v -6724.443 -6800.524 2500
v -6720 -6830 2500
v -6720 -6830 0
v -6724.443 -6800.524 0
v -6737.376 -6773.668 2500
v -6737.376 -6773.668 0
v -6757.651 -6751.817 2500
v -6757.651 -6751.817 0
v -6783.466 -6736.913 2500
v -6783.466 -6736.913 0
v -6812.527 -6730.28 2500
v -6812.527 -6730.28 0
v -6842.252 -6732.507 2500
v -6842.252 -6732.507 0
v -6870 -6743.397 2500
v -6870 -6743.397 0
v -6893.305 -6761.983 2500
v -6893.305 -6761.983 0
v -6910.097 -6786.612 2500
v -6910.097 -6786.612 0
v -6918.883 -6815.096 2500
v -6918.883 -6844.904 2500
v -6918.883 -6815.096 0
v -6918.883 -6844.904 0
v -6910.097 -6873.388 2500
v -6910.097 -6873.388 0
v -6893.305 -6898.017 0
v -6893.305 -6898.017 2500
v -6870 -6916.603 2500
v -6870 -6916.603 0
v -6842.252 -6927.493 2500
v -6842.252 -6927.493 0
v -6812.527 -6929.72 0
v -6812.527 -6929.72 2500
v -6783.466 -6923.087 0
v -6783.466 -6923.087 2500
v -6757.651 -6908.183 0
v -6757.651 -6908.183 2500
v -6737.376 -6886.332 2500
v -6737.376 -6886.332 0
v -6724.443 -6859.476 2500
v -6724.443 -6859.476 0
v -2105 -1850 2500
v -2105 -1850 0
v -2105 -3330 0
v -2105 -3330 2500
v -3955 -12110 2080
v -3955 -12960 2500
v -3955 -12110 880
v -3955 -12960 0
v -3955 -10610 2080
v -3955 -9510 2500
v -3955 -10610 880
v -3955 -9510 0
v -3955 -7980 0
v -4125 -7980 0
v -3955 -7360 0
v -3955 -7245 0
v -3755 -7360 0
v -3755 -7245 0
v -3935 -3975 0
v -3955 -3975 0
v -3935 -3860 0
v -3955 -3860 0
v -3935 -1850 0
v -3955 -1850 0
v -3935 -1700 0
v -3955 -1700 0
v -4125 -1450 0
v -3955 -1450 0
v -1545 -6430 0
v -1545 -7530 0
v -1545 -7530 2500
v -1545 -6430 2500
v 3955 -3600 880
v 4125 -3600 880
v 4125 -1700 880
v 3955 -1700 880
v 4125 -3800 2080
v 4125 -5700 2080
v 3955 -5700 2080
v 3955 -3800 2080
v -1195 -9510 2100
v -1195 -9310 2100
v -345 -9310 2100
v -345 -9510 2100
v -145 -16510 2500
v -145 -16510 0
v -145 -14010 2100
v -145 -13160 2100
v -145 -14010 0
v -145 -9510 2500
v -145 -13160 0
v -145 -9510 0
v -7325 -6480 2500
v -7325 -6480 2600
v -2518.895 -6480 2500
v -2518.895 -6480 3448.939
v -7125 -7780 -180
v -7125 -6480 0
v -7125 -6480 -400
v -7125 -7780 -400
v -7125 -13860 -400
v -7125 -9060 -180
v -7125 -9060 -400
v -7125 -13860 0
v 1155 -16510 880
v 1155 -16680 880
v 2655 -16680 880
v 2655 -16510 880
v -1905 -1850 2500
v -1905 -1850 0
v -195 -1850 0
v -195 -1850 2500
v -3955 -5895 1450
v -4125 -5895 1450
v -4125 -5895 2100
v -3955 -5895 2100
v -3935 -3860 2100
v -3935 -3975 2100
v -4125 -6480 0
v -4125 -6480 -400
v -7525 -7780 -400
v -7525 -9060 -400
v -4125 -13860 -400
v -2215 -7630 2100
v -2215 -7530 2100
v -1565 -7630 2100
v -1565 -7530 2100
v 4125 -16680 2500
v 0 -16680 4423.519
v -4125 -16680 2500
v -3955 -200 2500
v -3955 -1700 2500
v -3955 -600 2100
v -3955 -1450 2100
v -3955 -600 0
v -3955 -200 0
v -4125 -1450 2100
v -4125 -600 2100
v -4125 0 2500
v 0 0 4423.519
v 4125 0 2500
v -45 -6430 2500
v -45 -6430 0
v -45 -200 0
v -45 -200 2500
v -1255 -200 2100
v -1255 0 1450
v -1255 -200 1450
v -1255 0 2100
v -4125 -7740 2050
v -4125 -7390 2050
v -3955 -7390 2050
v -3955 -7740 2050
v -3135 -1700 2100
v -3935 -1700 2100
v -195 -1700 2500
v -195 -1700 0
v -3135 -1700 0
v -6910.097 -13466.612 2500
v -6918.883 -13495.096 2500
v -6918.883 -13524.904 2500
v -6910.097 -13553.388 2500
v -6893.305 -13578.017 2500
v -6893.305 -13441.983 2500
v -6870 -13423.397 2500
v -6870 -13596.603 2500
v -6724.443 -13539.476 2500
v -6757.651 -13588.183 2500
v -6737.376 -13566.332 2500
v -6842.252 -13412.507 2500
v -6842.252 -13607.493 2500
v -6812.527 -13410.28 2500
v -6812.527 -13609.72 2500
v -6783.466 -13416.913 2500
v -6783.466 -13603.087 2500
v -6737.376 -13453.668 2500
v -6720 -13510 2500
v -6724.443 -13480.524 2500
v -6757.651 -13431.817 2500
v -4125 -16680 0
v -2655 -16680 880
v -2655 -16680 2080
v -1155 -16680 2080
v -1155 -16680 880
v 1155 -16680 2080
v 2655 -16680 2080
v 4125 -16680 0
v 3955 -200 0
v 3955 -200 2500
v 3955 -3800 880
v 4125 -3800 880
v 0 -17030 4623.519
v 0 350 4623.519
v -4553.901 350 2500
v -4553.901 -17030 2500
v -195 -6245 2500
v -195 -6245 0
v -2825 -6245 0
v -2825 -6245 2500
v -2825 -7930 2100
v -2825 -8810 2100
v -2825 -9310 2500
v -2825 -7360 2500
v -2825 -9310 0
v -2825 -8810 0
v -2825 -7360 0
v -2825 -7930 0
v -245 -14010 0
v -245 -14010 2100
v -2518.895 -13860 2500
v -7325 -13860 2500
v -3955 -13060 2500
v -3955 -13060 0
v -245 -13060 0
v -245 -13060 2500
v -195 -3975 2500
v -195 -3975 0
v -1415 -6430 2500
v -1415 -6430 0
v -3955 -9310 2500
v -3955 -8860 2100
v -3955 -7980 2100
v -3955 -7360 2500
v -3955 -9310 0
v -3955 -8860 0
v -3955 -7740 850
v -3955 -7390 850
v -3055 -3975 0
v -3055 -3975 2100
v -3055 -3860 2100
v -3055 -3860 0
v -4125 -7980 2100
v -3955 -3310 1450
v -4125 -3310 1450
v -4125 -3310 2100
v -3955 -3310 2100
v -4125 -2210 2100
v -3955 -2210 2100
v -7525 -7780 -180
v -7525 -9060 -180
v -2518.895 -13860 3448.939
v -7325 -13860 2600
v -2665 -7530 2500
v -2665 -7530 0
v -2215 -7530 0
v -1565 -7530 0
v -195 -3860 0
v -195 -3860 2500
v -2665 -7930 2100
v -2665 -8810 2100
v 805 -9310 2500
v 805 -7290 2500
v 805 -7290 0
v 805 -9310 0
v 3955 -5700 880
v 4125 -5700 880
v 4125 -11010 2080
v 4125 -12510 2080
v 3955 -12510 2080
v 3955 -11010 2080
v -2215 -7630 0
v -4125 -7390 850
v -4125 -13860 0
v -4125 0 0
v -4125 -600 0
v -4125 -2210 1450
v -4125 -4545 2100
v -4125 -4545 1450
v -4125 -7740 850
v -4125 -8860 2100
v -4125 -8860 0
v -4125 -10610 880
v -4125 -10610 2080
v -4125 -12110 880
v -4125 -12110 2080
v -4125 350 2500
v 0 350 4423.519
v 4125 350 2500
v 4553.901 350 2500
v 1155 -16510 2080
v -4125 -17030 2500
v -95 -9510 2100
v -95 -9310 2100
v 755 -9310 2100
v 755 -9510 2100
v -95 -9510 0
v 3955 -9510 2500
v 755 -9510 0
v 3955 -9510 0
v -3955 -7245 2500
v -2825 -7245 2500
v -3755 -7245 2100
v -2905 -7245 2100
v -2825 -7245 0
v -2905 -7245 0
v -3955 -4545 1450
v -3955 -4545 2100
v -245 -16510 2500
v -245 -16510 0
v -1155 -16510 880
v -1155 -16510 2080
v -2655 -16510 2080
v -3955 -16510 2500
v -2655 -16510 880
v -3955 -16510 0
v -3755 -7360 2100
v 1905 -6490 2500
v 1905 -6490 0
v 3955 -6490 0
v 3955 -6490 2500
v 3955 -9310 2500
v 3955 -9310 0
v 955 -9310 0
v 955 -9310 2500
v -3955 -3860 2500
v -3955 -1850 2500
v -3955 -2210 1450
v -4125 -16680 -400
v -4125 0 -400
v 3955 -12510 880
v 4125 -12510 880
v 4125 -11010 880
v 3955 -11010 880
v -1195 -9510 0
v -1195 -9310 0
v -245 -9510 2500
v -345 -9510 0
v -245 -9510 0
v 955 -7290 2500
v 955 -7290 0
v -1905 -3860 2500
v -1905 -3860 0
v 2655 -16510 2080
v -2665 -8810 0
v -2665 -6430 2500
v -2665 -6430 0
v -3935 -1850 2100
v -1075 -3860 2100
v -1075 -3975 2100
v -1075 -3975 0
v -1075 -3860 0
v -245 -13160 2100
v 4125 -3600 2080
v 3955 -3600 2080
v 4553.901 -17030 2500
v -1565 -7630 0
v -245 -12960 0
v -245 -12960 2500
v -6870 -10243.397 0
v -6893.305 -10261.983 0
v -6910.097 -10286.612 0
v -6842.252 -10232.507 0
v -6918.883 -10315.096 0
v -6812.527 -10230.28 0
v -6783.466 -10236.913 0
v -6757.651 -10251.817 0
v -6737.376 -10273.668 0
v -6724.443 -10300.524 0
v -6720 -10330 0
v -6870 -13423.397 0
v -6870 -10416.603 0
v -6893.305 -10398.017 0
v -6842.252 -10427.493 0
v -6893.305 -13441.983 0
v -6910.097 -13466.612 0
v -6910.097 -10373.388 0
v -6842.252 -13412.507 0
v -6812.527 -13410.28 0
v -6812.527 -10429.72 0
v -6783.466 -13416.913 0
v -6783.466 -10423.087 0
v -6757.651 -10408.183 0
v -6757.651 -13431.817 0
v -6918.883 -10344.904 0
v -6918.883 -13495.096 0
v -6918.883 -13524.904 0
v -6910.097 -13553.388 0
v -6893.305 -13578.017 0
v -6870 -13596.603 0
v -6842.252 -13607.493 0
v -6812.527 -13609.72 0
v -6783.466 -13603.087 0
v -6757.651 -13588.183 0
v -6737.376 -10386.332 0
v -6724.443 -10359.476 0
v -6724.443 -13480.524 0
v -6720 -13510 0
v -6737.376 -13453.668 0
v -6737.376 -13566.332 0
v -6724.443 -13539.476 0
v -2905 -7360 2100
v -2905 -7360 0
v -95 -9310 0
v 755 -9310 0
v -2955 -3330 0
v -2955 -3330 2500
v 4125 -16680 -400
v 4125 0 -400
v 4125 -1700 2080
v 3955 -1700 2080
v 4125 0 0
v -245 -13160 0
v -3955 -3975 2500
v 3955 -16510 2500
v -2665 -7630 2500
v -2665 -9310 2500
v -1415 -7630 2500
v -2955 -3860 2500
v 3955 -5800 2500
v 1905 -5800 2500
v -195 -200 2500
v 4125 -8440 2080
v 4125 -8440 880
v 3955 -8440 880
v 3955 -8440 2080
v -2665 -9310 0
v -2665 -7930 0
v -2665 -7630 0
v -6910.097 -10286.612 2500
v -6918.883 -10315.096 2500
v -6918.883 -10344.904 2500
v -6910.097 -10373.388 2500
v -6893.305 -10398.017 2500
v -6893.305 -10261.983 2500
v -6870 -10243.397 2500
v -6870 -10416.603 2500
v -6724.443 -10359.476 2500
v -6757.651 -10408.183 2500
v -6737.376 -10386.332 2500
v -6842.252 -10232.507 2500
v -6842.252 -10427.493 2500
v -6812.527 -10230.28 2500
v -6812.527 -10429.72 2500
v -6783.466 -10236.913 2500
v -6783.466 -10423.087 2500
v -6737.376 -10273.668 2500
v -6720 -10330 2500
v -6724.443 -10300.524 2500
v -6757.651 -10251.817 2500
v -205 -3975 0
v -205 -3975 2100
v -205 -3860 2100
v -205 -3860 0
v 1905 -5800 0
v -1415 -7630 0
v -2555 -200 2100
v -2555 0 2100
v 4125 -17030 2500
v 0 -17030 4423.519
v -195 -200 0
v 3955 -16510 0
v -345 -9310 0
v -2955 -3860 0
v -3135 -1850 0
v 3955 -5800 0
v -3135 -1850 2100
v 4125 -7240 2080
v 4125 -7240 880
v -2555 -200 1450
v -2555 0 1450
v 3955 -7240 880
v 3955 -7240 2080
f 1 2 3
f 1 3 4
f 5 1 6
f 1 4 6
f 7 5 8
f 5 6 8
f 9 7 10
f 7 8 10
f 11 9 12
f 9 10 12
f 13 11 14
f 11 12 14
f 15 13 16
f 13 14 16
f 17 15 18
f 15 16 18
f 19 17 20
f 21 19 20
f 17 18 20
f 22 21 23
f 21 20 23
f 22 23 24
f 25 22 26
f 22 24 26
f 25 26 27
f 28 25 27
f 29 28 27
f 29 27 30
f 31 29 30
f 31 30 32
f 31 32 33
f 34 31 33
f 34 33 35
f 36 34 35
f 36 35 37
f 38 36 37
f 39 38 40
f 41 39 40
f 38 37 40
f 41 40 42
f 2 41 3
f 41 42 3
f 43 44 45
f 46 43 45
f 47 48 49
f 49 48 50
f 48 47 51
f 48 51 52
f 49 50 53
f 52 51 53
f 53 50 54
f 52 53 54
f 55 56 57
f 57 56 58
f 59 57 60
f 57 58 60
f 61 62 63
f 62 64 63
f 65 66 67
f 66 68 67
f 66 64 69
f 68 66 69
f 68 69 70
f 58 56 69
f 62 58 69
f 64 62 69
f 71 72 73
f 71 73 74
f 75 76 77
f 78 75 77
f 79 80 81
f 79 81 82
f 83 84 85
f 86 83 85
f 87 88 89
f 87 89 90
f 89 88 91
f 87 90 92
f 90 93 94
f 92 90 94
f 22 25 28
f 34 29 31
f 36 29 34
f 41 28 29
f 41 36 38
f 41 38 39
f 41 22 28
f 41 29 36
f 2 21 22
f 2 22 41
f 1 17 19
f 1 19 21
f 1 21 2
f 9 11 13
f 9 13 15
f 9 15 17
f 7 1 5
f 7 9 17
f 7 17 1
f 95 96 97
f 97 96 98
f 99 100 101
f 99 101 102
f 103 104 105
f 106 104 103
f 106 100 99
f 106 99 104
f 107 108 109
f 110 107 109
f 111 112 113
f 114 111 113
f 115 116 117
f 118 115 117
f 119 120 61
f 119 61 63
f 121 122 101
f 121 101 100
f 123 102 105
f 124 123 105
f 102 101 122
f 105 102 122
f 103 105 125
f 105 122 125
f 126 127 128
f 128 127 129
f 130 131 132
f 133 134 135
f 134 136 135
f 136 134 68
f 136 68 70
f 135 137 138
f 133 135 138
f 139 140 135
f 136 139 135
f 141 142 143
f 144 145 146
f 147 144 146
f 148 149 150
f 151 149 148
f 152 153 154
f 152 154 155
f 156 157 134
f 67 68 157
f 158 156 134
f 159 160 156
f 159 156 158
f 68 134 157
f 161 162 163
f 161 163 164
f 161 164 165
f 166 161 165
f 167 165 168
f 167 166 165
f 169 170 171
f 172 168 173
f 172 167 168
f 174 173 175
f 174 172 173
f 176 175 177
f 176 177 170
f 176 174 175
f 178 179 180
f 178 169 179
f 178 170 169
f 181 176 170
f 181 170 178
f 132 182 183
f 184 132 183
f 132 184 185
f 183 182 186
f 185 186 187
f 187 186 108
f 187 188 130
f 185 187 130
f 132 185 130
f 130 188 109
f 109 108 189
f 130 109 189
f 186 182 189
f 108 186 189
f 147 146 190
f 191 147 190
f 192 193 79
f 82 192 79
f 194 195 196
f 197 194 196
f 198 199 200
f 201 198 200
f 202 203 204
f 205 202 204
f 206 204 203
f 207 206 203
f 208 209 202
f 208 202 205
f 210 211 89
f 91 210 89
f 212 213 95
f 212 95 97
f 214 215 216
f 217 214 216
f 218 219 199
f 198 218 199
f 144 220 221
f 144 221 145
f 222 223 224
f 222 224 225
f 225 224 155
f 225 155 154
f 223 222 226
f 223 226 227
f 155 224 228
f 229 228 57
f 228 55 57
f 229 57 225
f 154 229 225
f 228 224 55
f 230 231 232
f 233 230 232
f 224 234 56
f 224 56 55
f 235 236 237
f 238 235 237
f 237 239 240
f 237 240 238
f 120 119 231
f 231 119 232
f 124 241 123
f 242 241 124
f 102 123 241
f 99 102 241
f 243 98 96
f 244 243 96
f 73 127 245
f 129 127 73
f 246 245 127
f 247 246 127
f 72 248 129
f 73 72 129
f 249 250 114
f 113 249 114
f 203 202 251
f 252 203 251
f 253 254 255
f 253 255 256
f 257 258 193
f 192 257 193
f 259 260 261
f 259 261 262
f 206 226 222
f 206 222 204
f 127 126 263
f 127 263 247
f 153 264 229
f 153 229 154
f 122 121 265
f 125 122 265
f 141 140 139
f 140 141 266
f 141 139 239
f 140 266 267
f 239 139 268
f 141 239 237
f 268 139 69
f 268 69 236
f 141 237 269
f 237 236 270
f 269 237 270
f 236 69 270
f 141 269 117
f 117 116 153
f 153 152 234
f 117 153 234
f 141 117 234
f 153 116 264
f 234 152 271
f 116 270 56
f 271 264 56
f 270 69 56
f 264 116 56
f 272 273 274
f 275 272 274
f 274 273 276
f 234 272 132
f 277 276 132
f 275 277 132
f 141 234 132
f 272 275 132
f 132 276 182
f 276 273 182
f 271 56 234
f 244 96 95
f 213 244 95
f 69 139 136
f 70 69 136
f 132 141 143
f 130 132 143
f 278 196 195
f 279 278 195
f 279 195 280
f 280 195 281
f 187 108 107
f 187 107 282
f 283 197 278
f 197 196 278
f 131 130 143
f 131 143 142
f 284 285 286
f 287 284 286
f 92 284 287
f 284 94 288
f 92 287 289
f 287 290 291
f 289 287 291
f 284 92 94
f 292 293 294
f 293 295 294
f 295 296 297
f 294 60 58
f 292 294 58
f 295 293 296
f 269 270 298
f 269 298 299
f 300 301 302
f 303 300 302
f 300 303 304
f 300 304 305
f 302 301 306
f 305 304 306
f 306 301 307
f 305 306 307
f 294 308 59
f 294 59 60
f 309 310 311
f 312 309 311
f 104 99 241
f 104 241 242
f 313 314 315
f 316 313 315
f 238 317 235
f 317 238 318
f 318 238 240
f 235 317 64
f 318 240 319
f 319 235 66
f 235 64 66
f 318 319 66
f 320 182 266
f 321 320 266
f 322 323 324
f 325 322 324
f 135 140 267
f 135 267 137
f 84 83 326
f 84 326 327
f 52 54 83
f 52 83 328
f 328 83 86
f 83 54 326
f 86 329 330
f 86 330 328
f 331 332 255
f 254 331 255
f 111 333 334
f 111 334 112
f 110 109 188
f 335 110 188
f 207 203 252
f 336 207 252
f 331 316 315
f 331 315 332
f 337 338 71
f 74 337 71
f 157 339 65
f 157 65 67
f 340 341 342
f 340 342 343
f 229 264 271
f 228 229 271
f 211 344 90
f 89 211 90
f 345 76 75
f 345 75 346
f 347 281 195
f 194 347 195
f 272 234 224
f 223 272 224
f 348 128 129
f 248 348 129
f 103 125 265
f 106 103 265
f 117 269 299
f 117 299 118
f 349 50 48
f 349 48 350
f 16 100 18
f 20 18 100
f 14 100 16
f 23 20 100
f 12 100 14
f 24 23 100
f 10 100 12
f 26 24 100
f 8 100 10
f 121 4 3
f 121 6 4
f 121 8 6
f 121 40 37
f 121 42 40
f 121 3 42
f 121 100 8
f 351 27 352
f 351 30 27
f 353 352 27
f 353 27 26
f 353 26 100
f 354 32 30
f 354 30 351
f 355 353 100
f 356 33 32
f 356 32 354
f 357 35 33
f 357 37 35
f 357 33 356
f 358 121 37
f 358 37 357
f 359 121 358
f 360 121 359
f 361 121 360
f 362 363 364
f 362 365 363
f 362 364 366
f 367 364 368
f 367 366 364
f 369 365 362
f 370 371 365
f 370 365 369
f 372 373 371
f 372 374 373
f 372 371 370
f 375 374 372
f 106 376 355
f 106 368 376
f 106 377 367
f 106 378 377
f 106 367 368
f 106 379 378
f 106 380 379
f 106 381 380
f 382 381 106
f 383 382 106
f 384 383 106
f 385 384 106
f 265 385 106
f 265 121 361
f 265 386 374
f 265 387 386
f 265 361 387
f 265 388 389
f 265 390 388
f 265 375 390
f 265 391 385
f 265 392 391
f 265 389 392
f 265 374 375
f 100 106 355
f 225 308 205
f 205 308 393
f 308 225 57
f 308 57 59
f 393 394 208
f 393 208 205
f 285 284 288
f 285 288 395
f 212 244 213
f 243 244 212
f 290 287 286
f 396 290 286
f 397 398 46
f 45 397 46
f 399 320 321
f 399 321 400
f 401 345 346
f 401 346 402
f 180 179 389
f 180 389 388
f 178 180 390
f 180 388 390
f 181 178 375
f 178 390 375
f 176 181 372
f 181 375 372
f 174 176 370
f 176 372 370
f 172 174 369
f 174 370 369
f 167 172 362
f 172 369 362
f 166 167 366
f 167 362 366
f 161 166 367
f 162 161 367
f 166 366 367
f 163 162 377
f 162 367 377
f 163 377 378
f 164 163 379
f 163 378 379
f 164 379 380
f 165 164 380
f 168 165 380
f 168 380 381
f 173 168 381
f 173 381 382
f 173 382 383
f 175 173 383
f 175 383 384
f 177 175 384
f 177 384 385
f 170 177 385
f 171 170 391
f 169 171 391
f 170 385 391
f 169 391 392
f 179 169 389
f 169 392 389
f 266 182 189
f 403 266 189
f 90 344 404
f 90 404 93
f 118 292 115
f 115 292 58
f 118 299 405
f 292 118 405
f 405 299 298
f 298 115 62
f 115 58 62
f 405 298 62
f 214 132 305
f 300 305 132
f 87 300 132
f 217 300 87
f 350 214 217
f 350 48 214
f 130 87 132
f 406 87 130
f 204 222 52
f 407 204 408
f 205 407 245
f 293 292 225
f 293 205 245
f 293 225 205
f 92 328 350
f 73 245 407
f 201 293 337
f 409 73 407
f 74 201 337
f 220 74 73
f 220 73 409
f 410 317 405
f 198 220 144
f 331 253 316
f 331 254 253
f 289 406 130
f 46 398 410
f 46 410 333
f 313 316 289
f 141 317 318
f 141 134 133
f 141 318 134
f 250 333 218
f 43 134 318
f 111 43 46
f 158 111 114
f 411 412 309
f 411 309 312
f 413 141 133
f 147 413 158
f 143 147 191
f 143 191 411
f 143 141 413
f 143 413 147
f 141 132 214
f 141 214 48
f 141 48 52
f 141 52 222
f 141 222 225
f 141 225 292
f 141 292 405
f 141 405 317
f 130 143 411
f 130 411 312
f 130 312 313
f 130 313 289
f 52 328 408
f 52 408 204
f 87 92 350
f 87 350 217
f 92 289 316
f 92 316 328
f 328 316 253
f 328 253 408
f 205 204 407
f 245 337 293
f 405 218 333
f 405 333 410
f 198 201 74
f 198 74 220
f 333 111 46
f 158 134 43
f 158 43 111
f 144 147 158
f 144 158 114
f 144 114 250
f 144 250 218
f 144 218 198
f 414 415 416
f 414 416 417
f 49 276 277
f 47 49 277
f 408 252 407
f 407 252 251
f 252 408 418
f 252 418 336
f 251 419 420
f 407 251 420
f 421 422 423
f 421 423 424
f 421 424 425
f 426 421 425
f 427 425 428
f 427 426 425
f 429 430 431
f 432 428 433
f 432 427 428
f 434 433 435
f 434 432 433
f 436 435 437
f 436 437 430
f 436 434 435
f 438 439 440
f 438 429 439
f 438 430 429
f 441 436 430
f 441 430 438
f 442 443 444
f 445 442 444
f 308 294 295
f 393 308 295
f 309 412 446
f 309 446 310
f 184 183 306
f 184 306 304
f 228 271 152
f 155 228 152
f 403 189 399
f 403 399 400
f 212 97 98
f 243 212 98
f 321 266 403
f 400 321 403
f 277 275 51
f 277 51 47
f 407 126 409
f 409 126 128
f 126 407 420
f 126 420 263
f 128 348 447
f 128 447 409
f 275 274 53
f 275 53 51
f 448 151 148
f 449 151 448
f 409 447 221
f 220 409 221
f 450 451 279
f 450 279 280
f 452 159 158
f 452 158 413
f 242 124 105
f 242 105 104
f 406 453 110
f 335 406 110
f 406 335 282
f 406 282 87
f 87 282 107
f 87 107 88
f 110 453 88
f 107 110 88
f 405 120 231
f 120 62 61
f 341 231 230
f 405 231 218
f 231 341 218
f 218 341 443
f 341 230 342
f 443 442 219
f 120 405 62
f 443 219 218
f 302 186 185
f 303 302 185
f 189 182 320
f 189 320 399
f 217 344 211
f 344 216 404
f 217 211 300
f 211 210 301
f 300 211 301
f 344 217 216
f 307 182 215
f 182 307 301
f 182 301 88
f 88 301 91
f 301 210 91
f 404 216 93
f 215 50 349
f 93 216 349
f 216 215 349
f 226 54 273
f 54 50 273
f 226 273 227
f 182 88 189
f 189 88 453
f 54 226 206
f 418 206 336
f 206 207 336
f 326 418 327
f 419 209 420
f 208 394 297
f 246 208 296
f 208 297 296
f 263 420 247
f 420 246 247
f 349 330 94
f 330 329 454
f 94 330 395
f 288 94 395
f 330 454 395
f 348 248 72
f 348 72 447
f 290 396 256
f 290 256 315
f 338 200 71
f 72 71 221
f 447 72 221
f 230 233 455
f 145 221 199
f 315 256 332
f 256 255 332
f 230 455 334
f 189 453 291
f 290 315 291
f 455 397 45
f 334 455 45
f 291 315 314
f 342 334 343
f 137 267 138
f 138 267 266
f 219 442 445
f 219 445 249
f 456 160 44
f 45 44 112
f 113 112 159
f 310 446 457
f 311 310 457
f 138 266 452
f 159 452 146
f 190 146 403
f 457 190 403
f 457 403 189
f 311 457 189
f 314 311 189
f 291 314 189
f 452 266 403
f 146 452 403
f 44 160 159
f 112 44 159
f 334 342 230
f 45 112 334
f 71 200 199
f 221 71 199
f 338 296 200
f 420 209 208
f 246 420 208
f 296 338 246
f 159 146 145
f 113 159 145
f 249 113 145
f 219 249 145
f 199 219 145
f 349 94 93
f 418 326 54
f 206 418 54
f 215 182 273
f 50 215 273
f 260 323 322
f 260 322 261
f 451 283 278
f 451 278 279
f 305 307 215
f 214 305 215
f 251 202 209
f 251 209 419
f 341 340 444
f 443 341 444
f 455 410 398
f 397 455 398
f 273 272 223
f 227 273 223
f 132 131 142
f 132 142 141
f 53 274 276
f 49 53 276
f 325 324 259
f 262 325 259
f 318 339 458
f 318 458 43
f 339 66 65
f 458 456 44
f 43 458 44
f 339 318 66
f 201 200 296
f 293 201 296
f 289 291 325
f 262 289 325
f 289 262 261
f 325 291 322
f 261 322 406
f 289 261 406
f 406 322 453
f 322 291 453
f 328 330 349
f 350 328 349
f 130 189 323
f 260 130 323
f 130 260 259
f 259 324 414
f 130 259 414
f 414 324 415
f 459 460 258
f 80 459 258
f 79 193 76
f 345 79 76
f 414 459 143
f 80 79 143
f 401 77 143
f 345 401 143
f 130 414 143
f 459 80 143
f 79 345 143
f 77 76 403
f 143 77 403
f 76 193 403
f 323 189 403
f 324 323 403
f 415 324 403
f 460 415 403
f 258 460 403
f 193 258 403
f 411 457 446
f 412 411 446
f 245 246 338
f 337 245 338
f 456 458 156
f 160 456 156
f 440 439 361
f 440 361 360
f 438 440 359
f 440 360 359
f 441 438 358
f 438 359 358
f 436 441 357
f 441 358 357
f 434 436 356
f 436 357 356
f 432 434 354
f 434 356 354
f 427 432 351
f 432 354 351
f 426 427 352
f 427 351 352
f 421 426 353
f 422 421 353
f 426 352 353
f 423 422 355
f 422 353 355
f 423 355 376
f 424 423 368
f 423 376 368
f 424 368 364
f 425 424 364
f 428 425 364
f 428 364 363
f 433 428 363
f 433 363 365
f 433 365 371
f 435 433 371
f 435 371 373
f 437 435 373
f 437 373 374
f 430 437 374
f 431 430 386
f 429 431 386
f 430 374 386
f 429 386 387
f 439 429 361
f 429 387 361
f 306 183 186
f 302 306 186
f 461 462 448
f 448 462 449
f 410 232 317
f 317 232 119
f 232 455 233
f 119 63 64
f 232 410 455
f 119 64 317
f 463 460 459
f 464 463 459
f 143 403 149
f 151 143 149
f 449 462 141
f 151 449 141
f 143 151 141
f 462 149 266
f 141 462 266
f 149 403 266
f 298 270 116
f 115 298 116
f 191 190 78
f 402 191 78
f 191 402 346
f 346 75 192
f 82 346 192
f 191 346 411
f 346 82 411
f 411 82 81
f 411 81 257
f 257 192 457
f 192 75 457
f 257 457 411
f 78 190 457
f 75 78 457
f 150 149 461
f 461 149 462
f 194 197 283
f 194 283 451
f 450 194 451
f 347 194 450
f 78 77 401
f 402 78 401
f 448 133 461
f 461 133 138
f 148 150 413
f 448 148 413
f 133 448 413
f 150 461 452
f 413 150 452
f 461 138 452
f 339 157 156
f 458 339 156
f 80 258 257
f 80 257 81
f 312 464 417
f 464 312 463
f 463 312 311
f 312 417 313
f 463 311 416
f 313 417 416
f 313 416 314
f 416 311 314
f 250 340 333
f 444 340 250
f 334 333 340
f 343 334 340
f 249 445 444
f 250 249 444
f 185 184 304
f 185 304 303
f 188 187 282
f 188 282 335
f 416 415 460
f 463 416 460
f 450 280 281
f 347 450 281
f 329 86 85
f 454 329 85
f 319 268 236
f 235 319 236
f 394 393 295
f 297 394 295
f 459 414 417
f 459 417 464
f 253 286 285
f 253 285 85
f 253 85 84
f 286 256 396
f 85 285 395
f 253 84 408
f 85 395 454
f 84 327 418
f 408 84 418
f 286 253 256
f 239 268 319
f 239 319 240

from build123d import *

# Parameters (mm, degrees)
F0_W           = 1130
F0_H           = 1950
F0_W_2         = 1120
F0_H_2         = 1100
F0_W_3         = 3760
F0_H_3         = 1500
F0_W_4         = 1710
F0_H_4         = 2010
F0_W_5         = 850
F0_H_5         = 530
F0_W_6         = 3710
F0_H_6         = 100
F1_DEPTH       = 2500
F3_START       = -400
F2_W           = 170
F2_H           = 850
F2_W_2         = 800
F2_H_2         = 150
F2_W_3         = 880
F2_H_3         = 115
F2_W_4         = 870
F2_W_5         = 850
F2_H_4         = 880
F2_W_6         = 650
F2_H_5         = 100
F2_W_7         = 160
F2_H_6         = 200
F2_W_8         = 100
F3_DEPTH       = 2100
F4_W           = 8250
F4_H           = 16680
F5_DEPTH       = 400
F6_W           = 1100
F6_H           = 650
F6_W_2         = 1350
F6_W_3         = 350
F6_H_2         = 1200
F6_W_4         = 1500
F10_DEPTH      = 170
F7_W           = 1300
F7_H           = 650
F11_DEPTH      = 200
F8_W           = 1200
F8_H           = 1200
F8_W_2         = 1900
F8_W_3         = 1500
F12_DEPTH      = 170
F9_W           = 1500
F9_H           = 1200
F13_DEPTH      = 170
F15_DEPTH      = 16680
F17_DEPTH      = 17030
F17_DEPTH_BACK = 350
F18_W          = 7380
F18_H          = 400
F19_DEPTH      = 3000
F20_W          = 1280
F20_H          = 220
F21_DEPTH      = 400
F22_R          = 100
F23_DEPTH      = 2500
F25_DEPTH      = 7380


# Not quite as in the source:
# - a feature names something its author has since deleted; it is built from what else it names


with BuildPart() as f1:
    # F0 (on Top) → F1 (new body)
    with BuildSketch(Plane.XY):
        Polygon((4125, 0), (-4125, 0), (-4125, -9510), (-3955, -9510), (-245, -9510), (-145, -9510), (3955, -9510), (4125, -9510), align=None)
        with Locations((-3390, -8335)):
            Rectangle(F0_W, F0_H, mode=Mode.SUBTRACT)
        with Locations((-2105, -6980)):
            Rectangle(F0_W_2, F0_H_2, mode=Mode.SUBTRACT)
        Polygon((-3955, -6245), (-3955, -3975), (-195, -3975), (-195, -6245), (-2825, -6245), (-2825, -7245), (-3955, -7245), align=None, mode=Mode.SUBTRACT)
        Polygon((-3955, -3860), (-3955, -1850), (-2105, -1850), (-2105, -3330), (-2105, -3860), (-2955, -3860), align=None, mode=Mode.SUBTRACT)
        with Locations((-2075, -950)):
            Rectangle(F0_W_3, F0_H_3, mode=Mode.SUBTRACT)
        with Locations((-1050, -2855)):
            Rectangle(F0_W_4, F0_H_4, mode=Mode.SUBTRACT)
        Polygon((-45, -6430), (-45, -200), (3955, -200), (3955, -5800), (1905, -5800), (1905, -6490), (3955, -6490), (3955, -9310), (955, -9310), (955, -7290), (805, -7290), (805, -9310), (-2665, -9310), (-2665, -7630), (-1415, -7630), (-1415, -6430), align=None, mode=Mode.SUBTRACT)
        with Locations((-2530, -3595)):
            Rectangle(F0_W_5, F0_H_5)
        Polygon((-145, -9510), (-245, -9510), (-245, -12960), (-245, -13060), (-245, -16510), (-145, -16510), align=None)
        with Locations((-2100, -13010)):
            Rectangle(F0_W_6, F0_H_6)
        Polygon((-3955, -9510), (-4125, -9510), (-4125, -16680), (4125, -16680), (4125, -9510), (3955, -9510), (3955, -16510), (-145, -16510), (-245, -16510), (-3955, -16510), (-3955, -13060), (-3955, -12960), align=None)
    extrude(amount=F1_DEPTH)

    # F2 (on face) → F3 (cut)
    with BuildSketch(Plane.XY.offset(2500).offset(F3_START)):
        with Locations((-4040, -1025)):
            Rectangle(F2_W, F2_H)
        with Locations((-3535, -1775)):
            Rectangle(F2_W_2, F2_H_2)
        with Locations((-3495, -3917.5)):
            Rectangle(F2_W_3, F2_H_3)
        with Locations((-640, -3917.5)):
            Rectangle(F2_W_4, F2_H_3)
        with Locations((-3330, -7302.5)):
            Rectangle(F2_W_5, F2_H_3)
        with Locations((-4040, -8420)):
            Rectangle(F2_W, F2_H_4)
        with Locations((-1890, -7580)):
            Rectangle(F2_W_6, F2_H_5)
        with Locations((-2745, -8370)):
            Rectangle(F2_W_7, F2_H_4)
        with Locations((-770, -9410)):
            Rectangle(F2_W_5, F2_H_6)
        with Locations((330, -9410)):
            Rectangle(F2_W_5, F2_H_6)
        with Locations((-195, -13585)):
            Rectangle(F2_W_8, F2_H)
    extrude(amount=-F3_DEPTH, mode=Mode.SUBTRACT)

    # F6 (on face) → F10 (cut, through all)
    with BuildSketch(Plane(origin=(-4125, 0, 0), x_dir=(0, -1, 0), z_dir=(-1, 0, 0))):
        with Locations((2760, 1775)):
            Rectangle(F6_W, F6_H)
        with Locations((5220, 1775)):
            Rectangle(F6_W_2, F6_H)
        with Locations((7565, 1450)):
            Rectangle(F6_W_3, F6_H_2)
        with Locations((11360, 1480)):
            Rectangle(F6_W_4, F6_H_2)
    extrude(amount=-F10_DEPTH, mode=Mode.SUBTRACT)

    # F7 (on face) → F11 (cut, through all)
    with BuildSketch(Plane(origin=(0, 0, 0), x_dir=(-1, 0, 0), z_dir=(0, 1, 0))):
        with Locations((1905, 1775)):
            Rectangle(F7_W, F7_H)
    extrude(amount=-F11_DEPTH, mode=Mode.SUBTRACT)

    # F8 (on face) → F12 (cut, through all)
    with BuildSketch(Plane.YZ.offset(4125)):
        with Locations((-7840, 1480)):
            Rectangle(F8_W, F8_H)
        with Locations((-4750, 1480)):
            Rectangle(F8_W_2, F8_H)
        with Locations((-2650, 1480)):
            Rectangle(F8_W_2, F8_H)
        with Locations((-11760, 1480)):
            Rectangle(F8_W_3, F8_H)
    extrude(amount=-F12_DEPTH, mode=Mode.SUBTRACT)

    # F9 (on face) → F13 (cut, through all)
    with BuildSketch(Plane.XZ.offset(16680)):
        with Locations((-1905, 1480)):
            Rectangle(F9_W, F9_H)
        with Locations((1905, 1480)):
            Rectangle(F9_W, F9_H)
    extrude(amount=-F13_DEPTH, mode=Mode.SUBTRACT)


with BuildPart() as f5:
    # F4 (on Top) → F5 (new body)
    with BuildSketch(Plane.XY):
        with Locations((0, -8340)):
            Rectangle(F4_W, F4_H)
    extrude(amount=-F5_DEPTH)


with BuildPart() as f15:
    # F14 (on face) → F15 (new body, through all)
    with BuildSketch(Plane.XZ.offset(16680)):
        Polygon((-4125, 2500), (4125, 2500), (0, 4423.5190898894), align=None)
    extrude(amount=-F15_DEPTH)


with BuildPart() as f17:
    # F16 (on face) → F17 (new body, two sides)
    with BuildSketch(Plane.XZ.offset(16680)) as f17_sk:
        Polygon((0, 4623.5190898894), (-4553.9013841019, 2500), (-4125, 2500), (0, 4423.5190898894), (4125, 2500), (4553.9013841019, 2500), align=None)
    extrude(amount=-F17_DEPTH)
    extrude(f17_sk.sketch, amount=F17_DEPTH_BACK)


with BuildPart() as f19:
    # F18 (on face) → F19 (new body)
    with BuildSketch(Plane(origin=(-4125, 0, 0), x_dir=(0, -1, 0), z_dir=(-1, 0, 0))):
        with Locations((10170, -200)):
            Rectangle(F18_W, F18_H)
    extrude(amount=F19_DEPTH)

    # F20 (on face) → F21 (join)
    with BuildSketch(Plane(origin=(-7125, 0, 0), x_dir=(0, -1, 0), z_dir=(-1, 0, 0))):
        with Locations((8420, -290)):
            Rectangle(F20_W, F20_H)
    extrude(amount=F21_DEPTH)

    # F22 (on face) → F23 (join)
    with BuildSketch(Plane.XY):
        with Locations((-6820, -6830)):
            Circle(F22_R)
        with Locations((-6820, -13510)):
            Circle(F22_R)
        with Locations((-6820, -10330)):
            Circle(F22_R)
    extrude(amount=F23_DEPTH)


with BuildPart() as f25:
    # F24 (on face) → F25 (new body, through all)
    with BuildSketch(Plane.XZ.offset(13860)):
        Polygon((-7325, 2500), (-2518.8954975725, 2500), (-2518.8954975725, 3448.9388292792), (-7325, 2600), align=None)
    extrude(amount=-F25_DEPTH)


solid = Compound([f1.part, f5.part, f15.part, f17.part, f19.part, f25.part])
